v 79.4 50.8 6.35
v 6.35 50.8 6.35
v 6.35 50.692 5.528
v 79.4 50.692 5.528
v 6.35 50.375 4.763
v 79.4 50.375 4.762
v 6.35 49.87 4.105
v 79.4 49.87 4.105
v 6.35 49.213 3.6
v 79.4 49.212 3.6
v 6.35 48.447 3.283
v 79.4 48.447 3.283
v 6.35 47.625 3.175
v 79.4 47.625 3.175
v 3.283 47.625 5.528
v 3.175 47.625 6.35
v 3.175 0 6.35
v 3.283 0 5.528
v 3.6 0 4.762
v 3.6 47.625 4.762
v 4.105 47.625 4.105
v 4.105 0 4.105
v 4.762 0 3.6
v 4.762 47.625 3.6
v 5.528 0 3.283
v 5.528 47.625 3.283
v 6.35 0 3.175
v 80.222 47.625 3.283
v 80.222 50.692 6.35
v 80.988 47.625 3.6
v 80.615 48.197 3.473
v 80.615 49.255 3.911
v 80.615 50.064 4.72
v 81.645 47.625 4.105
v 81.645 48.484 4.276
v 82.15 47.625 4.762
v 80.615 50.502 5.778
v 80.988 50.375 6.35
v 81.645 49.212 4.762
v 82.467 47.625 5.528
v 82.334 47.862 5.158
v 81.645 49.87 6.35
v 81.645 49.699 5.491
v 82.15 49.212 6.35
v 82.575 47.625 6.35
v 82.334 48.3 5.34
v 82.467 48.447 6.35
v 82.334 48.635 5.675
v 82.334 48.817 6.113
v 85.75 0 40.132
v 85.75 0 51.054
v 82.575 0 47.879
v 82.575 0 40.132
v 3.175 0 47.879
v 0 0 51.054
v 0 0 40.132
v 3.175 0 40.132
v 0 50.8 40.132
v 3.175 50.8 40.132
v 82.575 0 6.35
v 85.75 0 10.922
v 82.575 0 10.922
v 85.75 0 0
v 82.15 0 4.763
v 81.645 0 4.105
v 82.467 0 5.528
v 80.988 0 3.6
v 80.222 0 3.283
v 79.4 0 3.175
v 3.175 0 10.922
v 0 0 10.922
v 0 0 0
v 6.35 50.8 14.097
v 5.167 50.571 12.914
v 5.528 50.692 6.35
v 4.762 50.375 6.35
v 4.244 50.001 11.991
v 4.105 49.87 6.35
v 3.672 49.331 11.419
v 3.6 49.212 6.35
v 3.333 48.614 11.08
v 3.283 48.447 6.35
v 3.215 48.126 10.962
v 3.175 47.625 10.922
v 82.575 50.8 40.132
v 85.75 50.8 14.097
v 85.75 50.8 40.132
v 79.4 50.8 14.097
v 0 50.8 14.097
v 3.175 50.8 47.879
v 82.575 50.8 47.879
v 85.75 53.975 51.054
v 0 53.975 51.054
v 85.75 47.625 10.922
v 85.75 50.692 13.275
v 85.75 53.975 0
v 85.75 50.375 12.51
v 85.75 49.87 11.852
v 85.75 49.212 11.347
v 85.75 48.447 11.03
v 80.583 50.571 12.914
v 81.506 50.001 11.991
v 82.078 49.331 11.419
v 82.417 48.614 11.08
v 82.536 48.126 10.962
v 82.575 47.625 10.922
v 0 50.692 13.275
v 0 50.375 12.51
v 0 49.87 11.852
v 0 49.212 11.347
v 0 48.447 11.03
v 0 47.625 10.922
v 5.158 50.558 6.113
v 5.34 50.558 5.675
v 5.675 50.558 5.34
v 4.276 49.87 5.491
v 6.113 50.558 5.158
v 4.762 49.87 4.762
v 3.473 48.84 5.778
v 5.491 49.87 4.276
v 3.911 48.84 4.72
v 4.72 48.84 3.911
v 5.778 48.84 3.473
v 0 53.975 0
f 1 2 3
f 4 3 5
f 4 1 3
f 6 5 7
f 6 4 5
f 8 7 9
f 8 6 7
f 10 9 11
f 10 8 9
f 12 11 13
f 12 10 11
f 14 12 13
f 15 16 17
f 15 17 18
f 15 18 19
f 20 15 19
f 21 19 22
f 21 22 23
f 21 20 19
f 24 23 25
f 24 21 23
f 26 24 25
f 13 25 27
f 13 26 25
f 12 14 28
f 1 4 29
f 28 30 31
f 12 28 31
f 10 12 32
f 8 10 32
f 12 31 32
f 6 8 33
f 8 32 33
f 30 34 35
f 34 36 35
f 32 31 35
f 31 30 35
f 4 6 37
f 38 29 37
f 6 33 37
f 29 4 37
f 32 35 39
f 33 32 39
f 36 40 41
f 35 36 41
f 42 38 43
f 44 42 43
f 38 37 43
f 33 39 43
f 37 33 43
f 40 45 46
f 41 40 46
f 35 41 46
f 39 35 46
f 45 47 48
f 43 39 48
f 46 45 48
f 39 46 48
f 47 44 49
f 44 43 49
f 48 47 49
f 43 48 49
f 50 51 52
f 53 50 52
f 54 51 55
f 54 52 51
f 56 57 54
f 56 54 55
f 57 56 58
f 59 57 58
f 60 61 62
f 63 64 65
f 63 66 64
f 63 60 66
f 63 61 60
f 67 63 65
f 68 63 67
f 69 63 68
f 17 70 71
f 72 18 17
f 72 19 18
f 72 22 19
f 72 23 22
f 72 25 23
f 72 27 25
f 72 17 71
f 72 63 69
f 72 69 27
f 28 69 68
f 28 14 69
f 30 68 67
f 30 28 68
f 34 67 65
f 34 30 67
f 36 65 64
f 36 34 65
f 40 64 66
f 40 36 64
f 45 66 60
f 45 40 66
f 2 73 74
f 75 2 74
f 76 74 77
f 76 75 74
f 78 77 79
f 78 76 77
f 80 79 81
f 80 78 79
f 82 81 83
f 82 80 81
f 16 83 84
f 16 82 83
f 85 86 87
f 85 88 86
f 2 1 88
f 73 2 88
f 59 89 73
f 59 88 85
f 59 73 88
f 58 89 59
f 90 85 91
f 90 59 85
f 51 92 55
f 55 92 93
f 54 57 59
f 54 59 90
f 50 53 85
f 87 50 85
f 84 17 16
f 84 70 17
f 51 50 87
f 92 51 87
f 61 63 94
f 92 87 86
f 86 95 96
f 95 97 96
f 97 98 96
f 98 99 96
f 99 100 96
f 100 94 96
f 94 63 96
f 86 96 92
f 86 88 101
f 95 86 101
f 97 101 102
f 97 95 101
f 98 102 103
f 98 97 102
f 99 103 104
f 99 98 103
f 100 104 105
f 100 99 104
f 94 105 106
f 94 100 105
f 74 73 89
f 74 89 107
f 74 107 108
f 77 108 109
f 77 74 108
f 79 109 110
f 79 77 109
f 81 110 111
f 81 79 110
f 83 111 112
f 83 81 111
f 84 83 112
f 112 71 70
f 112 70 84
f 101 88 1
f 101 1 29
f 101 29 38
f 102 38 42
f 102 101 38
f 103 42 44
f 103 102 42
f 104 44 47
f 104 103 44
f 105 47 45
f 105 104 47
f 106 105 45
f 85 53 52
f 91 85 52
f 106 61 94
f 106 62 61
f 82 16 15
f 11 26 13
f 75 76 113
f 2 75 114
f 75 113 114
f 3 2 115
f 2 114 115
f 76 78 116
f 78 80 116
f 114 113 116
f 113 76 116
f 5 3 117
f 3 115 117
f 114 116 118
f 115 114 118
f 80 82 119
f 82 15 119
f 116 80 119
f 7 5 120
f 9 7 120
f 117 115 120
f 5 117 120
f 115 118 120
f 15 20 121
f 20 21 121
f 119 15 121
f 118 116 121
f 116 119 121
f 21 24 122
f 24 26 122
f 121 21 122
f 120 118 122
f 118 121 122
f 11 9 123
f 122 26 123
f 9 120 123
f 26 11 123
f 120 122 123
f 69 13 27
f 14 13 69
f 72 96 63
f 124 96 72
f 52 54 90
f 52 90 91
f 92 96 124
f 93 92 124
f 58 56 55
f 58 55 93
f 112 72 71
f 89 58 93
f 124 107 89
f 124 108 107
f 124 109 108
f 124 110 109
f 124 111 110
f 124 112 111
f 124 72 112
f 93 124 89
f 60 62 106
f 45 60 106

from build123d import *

# Parameters (mm, degrees)
SKETCH1_W           = 85.7504
SKETCH1_H           = 53.975
BOSS_EXTRUDE1_DEPTH = 51.054
SKETCH2_W           = 29.21
SKETCH2_H           = 50.8
CUT_EXTRUDE1_DEPTH  = 114.458991011
SKETCH3_W           = 79.4004
SKETCH3_H           = 50.8
CUT_EXTRUDE2_DEPTH  = 7.747
SKETCH4_W           = 79.4004
SKETCH4_H           = 7.747
CUT_EXTRUDE3_DEPTH  = 50.8
FILLET2_R           = 3.175
FILLET3_R           = 3.175
FILLET4_R           = 3.175
FILLET5_R           = 3.175
FILLET6_R           = 3.175


with BuildPart() as part:
    # Sketch1 → Boss-Extrude1 (new body)
    with BuildSketch(Plane(origin=(0, 0, 0), x_dir=(-1, 0, 0), z_dir=(0, 0, -1))):
        with Locations((-42.8752, 26.9875)):
            Rectangle(SKETCH1_W, SKETCH1_H)
    extrude(amount=-BOSS_EXTRUDE1_DEPTH)

    # Sketch2 → Cut-Extrude1 (cut, through all)
    with BuildSketch(Plane.ZY):
        with Locations((25.527, 25.4)):
            Rectangle(SKETCH2_W, SKETCH2_H)
    extrude(amount=-CUT_EXTRUDE1_DEPTH, mode=Mode.SUBTRACT)

    # Sketch3 → Cut-Extrude2 (cut)
    with BuildSketch(Plane.XY.offset(10.922)):
        with Locations((42.8752, 25.4)):
            Rectangle(SKETCH3_W, SKETCH3_H)
    extrude(amount=-CUT_EXTRUDE2_DEPTH, mode=Mode.SUBTRACT)

    # Sketch4 → Cut-Extrude3 (cut)
    with BuildSketch(Plane.XZ):
        with Locations((42.8752, 44.0055)):
            Rectangle(SKETCH4_W, SKETCH4_H)
    extrude(amount=-CUT_EXTRUDE3_DEPTH, mode=Mode.SUBTRACT)

    # Fillet2
    fillet2_edges = [part.edges().sort_by_distance(p)[0] for p in [
        (3.175, 25.4, 3.175),
    ]]
    fillet(fillet2_edges, radius=FILLET2_R)

    # Fillet3
    fillet3_edges = [part.edges().sort_by_distance(p)[0] for p in [
        (44.4627, 50.8, 3.175),
        (3.175, 50.8, 8.636),
        (4.10493597, 50.8, 4.10493597),
    ]]
    fillet(fillet3_edges, radius=FILLET3_R)

    # Fillet4
    fillet4_edges = [part.edges().sort_by_distance(p)[0] for p in [
        (3.175, 50.8, 10.922),
    ]]
    fillet(fillet4_edges, radius=FILLET4_R)

    # Fillet5
    fillet5_edges = [part.edges().sort_by_distance(p)[0] for p in [
        (82.5754, 23.8125, 3.175),
        (82.5754, 50.8, 8.636),
        (82.5754, 49.87006403, 4.10493597),
    ]]
    fillet(fillet5_edges, radius=FILLET5_R)

    # Fillet6
    fillet6_edges = [part.edges().sort_by_distance(p)[0] for p in [
        (82.5754, 50.8, 10.922),
    ]]
    fillet(fillet6_edges, radius=FILLET6_R)


solid = part.part
